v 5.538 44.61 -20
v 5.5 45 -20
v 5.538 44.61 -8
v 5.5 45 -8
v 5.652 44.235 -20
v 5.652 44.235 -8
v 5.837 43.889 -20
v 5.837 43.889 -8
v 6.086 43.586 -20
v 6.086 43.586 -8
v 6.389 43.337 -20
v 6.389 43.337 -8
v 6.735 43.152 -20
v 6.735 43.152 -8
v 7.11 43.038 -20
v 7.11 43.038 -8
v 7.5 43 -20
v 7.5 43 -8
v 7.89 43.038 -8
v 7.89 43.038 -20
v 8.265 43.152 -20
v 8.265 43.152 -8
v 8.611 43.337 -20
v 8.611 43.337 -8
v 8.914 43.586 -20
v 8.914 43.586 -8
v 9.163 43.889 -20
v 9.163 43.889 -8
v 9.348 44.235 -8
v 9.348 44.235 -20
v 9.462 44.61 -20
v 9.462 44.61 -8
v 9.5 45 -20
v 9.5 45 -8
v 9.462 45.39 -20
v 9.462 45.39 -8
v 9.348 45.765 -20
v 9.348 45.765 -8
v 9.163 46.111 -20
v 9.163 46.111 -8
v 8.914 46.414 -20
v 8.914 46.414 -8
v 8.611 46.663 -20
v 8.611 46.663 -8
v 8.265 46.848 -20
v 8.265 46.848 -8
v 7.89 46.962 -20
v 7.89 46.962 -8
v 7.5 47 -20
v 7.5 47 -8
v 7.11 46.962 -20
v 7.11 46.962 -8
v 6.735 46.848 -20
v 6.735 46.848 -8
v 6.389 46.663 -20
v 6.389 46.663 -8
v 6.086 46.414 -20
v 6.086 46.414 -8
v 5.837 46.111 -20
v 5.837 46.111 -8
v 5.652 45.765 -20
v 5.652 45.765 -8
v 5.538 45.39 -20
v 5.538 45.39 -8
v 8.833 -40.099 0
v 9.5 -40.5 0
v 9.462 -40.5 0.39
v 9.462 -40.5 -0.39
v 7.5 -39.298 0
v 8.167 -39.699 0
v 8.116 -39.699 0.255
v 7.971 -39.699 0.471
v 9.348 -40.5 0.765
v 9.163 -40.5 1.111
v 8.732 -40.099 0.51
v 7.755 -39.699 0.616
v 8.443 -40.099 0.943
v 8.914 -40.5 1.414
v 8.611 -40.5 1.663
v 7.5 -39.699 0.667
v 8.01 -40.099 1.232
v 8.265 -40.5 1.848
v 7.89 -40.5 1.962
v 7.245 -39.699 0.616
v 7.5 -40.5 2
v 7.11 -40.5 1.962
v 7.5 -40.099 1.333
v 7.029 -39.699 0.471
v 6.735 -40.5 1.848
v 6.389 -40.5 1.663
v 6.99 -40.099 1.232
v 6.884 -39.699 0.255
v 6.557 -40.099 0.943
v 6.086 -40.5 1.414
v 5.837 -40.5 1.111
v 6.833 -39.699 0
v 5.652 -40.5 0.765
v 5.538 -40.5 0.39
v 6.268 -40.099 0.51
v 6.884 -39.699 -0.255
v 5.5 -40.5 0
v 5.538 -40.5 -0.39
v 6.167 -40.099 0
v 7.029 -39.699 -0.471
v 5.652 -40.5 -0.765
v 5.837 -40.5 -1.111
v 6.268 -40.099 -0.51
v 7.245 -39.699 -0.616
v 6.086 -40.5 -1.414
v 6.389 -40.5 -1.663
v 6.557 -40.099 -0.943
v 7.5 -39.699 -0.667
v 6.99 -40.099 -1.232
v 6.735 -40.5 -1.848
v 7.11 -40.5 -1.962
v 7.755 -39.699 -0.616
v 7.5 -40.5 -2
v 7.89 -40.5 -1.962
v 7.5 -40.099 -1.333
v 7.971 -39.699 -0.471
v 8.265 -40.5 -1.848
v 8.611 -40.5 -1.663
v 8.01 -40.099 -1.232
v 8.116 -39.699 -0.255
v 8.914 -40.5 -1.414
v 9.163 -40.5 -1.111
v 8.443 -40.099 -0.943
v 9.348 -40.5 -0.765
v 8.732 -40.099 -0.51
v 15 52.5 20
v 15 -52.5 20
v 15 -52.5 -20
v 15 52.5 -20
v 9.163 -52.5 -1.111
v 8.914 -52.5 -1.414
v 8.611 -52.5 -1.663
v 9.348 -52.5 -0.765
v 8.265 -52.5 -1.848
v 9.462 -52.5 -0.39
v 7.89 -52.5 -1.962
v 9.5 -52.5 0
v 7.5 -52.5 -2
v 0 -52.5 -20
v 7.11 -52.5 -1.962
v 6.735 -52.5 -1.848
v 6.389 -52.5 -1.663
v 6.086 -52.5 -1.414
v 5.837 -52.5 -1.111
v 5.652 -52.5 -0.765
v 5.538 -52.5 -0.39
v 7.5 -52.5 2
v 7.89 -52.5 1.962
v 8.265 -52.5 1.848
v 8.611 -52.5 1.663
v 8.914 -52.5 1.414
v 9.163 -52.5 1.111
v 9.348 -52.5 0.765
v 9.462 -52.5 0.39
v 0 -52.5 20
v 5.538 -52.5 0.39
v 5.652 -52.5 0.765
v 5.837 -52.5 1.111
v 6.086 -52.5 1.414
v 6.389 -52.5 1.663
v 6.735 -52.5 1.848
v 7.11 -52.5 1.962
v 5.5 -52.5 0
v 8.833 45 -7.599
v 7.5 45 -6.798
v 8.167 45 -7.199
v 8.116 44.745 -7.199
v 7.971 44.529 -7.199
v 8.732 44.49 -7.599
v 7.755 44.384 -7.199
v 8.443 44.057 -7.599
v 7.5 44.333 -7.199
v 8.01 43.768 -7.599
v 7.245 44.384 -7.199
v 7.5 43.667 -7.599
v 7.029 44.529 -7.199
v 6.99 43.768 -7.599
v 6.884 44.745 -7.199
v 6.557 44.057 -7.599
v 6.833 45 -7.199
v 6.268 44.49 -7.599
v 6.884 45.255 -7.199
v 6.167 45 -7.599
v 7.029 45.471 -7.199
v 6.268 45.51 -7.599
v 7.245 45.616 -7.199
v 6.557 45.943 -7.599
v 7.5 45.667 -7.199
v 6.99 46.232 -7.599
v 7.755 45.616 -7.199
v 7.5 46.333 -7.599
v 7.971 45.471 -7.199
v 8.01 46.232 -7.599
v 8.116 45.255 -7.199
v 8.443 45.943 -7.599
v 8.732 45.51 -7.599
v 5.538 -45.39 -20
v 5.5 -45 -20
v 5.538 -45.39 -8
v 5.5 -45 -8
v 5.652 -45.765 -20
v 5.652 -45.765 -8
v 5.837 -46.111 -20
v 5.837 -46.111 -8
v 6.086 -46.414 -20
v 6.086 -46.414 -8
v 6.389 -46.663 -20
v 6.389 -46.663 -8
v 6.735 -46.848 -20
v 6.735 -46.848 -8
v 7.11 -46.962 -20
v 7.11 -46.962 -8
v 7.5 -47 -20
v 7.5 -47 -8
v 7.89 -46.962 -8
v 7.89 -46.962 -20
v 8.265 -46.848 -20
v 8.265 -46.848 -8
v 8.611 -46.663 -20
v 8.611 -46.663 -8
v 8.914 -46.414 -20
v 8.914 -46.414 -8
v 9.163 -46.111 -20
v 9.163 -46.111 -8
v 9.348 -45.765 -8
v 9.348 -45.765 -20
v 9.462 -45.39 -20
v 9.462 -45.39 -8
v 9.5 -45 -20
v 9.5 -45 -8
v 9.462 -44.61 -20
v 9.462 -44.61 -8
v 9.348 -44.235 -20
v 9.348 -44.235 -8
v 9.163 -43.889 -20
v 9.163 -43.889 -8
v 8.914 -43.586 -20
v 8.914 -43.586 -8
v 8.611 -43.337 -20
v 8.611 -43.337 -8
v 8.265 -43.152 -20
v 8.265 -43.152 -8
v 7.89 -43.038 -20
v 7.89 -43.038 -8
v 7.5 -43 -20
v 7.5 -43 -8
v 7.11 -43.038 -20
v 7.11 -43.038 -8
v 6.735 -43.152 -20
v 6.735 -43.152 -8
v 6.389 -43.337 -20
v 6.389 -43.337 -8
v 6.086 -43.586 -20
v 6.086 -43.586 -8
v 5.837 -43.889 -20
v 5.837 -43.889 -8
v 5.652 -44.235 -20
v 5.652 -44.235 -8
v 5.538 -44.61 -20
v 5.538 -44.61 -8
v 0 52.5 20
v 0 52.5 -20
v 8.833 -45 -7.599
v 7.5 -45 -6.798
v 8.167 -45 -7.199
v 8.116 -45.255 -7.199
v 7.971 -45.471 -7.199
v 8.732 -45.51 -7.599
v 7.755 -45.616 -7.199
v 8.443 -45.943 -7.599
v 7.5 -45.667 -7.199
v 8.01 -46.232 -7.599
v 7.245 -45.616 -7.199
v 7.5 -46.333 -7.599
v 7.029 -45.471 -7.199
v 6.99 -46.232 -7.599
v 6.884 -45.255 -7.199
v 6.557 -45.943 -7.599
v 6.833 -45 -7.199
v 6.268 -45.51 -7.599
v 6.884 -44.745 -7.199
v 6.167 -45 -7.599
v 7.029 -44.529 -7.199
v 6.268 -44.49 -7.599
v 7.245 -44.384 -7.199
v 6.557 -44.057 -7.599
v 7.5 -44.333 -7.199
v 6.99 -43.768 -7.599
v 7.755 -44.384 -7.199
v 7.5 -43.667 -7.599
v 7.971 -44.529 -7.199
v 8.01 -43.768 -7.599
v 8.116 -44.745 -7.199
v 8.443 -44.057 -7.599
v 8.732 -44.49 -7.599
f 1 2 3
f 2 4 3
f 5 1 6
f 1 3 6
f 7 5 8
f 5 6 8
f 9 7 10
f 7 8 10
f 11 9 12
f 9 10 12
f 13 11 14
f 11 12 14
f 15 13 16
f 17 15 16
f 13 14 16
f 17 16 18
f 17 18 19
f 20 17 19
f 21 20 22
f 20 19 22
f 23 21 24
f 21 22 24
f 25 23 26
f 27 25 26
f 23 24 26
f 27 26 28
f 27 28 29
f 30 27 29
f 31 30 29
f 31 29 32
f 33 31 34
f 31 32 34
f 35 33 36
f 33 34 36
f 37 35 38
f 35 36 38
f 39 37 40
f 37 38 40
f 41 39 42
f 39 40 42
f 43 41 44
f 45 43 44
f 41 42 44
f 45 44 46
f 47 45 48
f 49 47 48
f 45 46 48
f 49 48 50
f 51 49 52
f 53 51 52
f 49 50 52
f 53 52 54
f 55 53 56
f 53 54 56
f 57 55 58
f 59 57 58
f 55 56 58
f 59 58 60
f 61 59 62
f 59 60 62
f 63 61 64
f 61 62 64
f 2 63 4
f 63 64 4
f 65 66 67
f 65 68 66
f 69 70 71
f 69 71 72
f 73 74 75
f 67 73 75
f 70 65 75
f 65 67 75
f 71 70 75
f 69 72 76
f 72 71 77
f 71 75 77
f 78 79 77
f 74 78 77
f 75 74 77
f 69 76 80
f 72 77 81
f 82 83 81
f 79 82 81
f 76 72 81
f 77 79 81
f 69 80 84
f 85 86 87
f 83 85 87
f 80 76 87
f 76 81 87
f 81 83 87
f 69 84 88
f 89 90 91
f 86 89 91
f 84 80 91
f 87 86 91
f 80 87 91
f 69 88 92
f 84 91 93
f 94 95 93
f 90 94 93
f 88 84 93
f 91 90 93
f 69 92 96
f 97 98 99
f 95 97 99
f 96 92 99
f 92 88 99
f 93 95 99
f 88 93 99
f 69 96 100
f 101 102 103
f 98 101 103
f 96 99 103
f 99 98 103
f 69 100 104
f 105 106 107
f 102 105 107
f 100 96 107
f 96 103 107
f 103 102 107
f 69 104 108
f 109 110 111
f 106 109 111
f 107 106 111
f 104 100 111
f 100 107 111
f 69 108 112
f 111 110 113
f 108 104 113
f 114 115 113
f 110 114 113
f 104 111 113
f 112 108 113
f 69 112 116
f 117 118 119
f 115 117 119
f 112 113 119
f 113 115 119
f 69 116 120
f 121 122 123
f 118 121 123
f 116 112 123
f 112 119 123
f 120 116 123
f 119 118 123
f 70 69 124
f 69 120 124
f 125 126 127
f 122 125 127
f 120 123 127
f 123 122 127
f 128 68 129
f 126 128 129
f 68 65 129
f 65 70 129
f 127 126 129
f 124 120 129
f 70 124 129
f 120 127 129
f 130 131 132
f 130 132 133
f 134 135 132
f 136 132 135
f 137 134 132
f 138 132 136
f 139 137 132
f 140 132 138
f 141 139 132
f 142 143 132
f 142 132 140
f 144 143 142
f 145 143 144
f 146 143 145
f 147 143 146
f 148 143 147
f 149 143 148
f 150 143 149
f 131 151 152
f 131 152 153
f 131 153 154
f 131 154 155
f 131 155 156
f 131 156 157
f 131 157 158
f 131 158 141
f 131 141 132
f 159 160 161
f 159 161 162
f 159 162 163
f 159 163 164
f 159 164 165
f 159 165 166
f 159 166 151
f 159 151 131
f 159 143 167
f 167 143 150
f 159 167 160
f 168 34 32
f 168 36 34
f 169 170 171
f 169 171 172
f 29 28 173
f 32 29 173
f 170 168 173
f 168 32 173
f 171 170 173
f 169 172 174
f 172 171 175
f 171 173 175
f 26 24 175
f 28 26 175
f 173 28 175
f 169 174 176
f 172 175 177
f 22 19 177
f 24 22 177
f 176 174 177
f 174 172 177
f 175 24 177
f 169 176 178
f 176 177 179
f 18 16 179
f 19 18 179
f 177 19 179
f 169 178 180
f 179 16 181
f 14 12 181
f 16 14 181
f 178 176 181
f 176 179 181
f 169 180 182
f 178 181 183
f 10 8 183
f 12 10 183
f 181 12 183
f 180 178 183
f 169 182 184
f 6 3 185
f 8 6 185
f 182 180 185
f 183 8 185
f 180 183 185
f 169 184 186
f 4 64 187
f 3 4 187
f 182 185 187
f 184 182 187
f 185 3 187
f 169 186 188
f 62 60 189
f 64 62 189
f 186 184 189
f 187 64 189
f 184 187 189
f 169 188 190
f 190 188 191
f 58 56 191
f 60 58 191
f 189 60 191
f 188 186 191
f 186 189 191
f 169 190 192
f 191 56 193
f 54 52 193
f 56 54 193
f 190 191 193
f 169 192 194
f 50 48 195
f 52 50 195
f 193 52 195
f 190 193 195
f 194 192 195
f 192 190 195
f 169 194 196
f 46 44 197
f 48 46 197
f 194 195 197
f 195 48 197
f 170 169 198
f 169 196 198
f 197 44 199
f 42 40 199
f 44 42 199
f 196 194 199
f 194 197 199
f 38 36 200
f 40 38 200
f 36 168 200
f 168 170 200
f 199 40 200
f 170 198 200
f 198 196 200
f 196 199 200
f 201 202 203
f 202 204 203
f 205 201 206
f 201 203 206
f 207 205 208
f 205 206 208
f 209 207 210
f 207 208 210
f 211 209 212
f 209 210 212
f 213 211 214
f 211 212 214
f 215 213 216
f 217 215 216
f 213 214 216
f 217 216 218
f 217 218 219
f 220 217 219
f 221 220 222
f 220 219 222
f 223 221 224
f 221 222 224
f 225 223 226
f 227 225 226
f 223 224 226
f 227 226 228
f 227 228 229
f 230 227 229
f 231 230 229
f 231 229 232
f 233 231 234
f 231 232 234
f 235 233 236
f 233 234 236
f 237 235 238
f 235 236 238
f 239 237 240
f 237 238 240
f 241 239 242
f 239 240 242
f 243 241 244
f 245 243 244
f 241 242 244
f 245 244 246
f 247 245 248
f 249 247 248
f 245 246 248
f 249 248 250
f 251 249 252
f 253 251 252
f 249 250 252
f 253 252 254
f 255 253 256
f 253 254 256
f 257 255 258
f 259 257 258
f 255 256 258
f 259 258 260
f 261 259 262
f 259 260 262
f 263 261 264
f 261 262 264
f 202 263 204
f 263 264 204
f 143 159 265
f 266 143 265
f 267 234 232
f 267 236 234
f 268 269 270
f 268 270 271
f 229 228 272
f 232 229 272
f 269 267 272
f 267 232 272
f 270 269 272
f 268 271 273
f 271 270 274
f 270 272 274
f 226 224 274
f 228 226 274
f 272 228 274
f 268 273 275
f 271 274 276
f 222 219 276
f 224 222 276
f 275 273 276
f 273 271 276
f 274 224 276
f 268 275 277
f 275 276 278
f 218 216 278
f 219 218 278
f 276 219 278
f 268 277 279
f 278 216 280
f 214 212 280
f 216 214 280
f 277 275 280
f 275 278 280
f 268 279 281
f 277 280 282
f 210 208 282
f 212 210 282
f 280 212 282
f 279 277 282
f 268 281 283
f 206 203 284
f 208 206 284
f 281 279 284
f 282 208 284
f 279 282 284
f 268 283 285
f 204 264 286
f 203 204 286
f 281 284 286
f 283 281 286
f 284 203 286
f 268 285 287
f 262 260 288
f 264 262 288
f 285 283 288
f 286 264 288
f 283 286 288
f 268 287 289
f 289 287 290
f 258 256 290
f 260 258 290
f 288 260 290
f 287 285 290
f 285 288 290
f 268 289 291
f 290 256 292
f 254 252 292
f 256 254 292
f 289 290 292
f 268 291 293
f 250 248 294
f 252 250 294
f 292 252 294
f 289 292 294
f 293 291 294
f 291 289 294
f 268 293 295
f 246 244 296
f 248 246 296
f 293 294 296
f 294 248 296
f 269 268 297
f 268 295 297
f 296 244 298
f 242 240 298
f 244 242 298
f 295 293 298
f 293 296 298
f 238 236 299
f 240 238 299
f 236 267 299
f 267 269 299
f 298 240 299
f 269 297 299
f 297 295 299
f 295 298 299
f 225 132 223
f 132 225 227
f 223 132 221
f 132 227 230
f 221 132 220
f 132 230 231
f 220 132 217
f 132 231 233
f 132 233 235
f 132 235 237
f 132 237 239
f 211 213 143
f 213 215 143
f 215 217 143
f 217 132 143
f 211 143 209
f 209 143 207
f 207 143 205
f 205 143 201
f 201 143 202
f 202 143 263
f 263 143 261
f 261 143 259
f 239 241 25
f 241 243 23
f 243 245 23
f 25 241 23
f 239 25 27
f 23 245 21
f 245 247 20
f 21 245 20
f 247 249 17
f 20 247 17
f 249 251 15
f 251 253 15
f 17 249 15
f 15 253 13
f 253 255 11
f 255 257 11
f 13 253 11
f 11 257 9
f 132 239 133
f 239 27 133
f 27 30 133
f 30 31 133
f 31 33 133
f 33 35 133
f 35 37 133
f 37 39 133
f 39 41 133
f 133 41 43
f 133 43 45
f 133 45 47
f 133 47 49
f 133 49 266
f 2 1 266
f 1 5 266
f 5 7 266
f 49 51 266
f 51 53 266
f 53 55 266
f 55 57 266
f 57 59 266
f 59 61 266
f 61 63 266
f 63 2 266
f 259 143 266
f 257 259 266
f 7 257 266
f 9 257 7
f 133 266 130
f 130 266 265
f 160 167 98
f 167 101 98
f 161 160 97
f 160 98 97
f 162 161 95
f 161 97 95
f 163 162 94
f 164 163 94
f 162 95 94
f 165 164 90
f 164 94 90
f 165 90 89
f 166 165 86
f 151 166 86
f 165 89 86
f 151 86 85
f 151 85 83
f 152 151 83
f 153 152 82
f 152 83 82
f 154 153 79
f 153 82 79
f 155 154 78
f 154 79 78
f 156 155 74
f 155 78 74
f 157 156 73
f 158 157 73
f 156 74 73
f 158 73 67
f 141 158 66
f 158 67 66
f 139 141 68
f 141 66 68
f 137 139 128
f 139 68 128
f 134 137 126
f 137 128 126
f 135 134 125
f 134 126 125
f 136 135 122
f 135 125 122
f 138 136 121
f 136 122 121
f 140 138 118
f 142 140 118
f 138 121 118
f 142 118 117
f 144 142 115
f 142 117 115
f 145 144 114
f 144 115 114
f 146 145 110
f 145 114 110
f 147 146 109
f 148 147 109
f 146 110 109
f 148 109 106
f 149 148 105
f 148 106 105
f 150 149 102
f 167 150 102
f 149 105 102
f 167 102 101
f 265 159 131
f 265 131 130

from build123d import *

# Parameters (mm, degrees)
F0_W     = 105
F0_H     = 40
F1_DEPTH = 15
F3_D     = 4
F3_DEPTH = 12
F3_TIP   = 1.2017212381
F5_D     = 4
F5_DEPTH = 12
F5_TIP   = 1.2017212381


with BuildPart() as f1:
    # F0 (on Right) → F1 (new body)
    with BuildSketch(Plane.YZ):
        Rectangle(F0_W, F0_H)
    extrude(amount=F1_DEPTH)

    # F3
    with Locations(Plane.XZ.offset(52.5)):
        with Locations((7.5, 0)):
            Hole(F3_D / 2, depth=F3_DEPTH)
            with Locations((0, 0, -(F3_DEPTH + F3_TIP / 2))):  # 118° drill point
                Cone(0, F3_D / 2, F3_TIP, mode=Mode.SUBTRACT)

    # F5
    with Locations(Plane(origin=(0, 0, -20), x_dir=(1, 0, 0), z_dir=(0, 0, -1))):
        with Locations((7.5, 45), (7.5, -45)):
            Hole(F5_D / 2, depth=F5_DEPTH)
            with Locations((0, 0, -(F5_DEPTH + F5_TIP / 2))):  # 118° drill point
                Cone(0, F5_D / 2, F5_TIP, mode=Mode.SUBTRACT)


solid = f1.part
